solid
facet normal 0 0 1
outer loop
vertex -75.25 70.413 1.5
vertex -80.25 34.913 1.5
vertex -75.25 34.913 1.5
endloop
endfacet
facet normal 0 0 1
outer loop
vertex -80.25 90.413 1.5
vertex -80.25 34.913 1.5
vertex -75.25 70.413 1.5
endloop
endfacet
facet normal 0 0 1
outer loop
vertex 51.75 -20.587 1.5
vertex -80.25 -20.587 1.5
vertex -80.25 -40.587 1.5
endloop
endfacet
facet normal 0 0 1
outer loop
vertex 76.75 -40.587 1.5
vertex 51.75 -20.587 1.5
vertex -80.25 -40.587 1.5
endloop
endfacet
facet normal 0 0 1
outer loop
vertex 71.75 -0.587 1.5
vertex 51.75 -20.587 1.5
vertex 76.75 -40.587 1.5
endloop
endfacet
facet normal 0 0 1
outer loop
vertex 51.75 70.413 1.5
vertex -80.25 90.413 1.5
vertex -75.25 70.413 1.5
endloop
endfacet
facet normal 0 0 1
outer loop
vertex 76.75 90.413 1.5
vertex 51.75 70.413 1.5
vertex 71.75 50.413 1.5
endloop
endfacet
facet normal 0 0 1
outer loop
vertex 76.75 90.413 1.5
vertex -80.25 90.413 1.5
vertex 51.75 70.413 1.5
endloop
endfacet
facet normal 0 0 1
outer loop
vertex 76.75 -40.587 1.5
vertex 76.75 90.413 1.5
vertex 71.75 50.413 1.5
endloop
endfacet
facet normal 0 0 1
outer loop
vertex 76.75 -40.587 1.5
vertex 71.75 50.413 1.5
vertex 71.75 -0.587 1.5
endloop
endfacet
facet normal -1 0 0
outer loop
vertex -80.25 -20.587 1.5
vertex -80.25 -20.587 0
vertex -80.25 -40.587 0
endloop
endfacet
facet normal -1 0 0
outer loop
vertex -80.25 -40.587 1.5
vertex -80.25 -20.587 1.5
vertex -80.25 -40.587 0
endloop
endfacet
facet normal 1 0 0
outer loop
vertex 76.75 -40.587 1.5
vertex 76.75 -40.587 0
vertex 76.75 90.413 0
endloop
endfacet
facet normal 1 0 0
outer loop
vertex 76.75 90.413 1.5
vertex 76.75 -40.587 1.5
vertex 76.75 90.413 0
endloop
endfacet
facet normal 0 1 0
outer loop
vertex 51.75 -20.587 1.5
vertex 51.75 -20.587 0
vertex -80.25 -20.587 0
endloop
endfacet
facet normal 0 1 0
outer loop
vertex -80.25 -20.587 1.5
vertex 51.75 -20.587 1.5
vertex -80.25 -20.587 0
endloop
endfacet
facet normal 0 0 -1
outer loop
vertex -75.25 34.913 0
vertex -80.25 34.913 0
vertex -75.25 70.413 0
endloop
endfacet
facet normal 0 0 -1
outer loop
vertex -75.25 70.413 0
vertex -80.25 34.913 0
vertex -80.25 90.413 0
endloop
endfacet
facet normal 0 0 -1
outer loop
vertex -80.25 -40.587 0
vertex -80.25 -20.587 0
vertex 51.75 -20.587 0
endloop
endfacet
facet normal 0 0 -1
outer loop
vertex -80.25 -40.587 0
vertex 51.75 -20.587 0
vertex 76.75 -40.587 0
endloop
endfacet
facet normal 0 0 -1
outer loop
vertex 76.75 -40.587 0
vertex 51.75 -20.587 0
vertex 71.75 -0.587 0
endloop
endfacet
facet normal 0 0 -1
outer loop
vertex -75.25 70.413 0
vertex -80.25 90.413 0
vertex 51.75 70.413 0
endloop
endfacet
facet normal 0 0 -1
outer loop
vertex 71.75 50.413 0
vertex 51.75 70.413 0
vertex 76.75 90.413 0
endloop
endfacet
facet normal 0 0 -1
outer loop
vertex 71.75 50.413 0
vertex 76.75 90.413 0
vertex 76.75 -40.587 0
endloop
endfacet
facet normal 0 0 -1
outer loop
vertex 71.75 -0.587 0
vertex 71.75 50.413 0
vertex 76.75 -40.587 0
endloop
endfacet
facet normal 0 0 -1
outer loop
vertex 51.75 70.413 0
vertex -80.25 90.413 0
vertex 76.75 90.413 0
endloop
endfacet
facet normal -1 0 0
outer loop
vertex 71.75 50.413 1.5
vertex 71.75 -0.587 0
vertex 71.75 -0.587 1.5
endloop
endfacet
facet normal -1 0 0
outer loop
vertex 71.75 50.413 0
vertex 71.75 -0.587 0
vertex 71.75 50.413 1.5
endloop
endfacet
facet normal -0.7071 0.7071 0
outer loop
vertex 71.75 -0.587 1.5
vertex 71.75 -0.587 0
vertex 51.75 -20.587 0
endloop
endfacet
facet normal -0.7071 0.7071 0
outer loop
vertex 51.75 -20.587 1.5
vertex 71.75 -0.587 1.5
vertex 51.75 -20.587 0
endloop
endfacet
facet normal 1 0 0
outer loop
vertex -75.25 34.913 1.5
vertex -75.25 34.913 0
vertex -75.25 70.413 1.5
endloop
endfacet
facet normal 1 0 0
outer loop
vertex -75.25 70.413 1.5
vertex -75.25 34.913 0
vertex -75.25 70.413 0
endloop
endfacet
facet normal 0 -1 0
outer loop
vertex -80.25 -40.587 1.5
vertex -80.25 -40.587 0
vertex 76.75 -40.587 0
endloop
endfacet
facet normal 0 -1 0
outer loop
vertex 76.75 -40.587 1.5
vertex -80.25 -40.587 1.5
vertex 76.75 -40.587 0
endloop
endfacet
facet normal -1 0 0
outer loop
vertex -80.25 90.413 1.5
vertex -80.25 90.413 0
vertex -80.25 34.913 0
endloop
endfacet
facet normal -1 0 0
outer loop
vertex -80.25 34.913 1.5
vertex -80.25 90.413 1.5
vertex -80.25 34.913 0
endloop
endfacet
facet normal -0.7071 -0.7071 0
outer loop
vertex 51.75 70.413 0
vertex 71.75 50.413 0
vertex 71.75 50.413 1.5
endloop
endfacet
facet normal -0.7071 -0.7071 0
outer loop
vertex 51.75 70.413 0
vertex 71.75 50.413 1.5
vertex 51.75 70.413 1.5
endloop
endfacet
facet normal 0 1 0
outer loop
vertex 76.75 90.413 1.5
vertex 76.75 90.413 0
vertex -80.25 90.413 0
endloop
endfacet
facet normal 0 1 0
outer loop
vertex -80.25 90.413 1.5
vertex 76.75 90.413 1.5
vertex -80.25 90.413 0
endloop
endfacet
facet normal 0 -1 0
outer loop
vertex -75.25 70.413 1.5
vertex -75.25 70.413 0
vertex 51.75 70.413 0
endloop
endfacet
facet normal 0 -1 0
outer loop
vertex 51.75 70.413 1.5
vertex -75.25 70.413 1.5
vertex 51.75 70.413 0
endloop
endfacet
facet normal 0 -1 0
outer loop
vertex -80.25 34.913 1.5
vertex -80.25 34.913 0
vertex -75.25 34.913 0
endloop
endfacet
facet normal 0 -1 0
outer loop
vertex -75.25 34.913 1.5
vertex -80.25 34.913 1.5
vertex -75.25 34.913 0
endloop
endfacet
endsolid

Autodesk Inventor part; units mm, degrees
ref_plane "YZ Plane" through (0, 0, 0) normal (1, 0, 0) x (0, 1, 0)
ref_plane "XZ Plane" through (0, 0, 0) normal (0, 1, 0) x (-1, 0, 0)
ref_plane "XY Plane" through (0, 0, 0) normal (0, 0, 1) x (1, 0, 0)
sketch "Эскиз1" plane through (0, 0, 0) normal (0, 0, 1) x (1, 0, 0)
  line L0 (0, 0) -> (-80.25, 0) construction
  line L1 (-80.25, 0) -> (-80.25, -18.086) construction
  line L2 (-80.25, -18.086) -> (0, -18.086) construction
  line L3 (0, -18.086) -> (0, 0) construction
  line L4 (-80.25, -18.086) -> (-80.25, -40.587) construction
  line L5 (-80.25, -18.086) -> (-57.749, -18.086) construction
  line L6 (-80.25, -40.587) -> (76.75, -40.587)
  line L7 (76.75, -40.587) -> (76.75, 90.413)
  line L8 (76.75, 90.413) -> (-80.25, 90.413)
  line L9 (-80.25, 90.413) -> (-80.25, -40.587)
  line L10 (-80.25, -40.587) -> (76.75, -40.587)
  line L11 (76.75, -40.587) -> (76.75, -20.587)
  line L12 (76.75, -20.587) -> (-80.25, -20.587)
  line L13 (-80.25, -20.587) -> (-80.25, -40.587)
  line L14 (76.75, 90.413) -> (-80.25, 90.413)
  line L15 (-80.25, 90.413) -> (-80.25, 70.413)
  line L16 (-80.25, 70.413) -> (76.75, 70.413)
  line L17 (76.75, 70.413) -> (76.75, 90.413)
  line L18 (-80.25, -40.587) -> (-75.25, -40.587)
  line L19 (-75.25, -40.587) -> (-75.25, 90.413)
  line L20 (-75.25, 90.413) -> (-80.25, 90.413)
  line L21 (-80.25, 90.413) -> (-80.25, -40.587)
  line L22 (76.75, -40.587) -> (71.75, -40.587)
  line L23 (71.75, -40.587) -> (71.75, 90.413)
  line L24 (71.75, 90.413) -> (76.75, 90.413)
  line L25 (76.75, 90.413) -> (76.75, -40.587)
  line L26 (76.75, -40.587) -> (41.75, -40.587)
  line L27 (41.75, -40.587) -> (41.75, -20.587)
  line L28 (41.75, -40.587) -> (61.75, -40.587) construction
  line L29 (76.75, 24.913) -> (-80.25, 24.913)
  line L30 (41.75, 90.413) -> (41.75, 70.413)
  line L31 (71.75, 70.413) -> (71.75, 50.413)
  line L32 (71.75, 50.413) -> (51.75, 70.413)
  line L33 (71.75, 50.413) -> (100.0343, 50.413) construction
  line L34 (71.75, -0.587) -> (51.75, -20.587)
  line L35 (-75.25, 24.913) -> (-80.25, 24.913)
  line L36 (-80.25, 24.913) -> (-80.25, 34.913)
  line L37 (-80.25, 34.913) -> (-75.25, 34.913)
  line L38 (-75.25, 34.913) -> (-75.25, 24.913)
  point P0 (-75.25, -20.587)
  point P1 (-75.25, 70.413)
  point P2 (71.75, -20.587)
  dimension "d0" = 80.25
  dimension "d1" = 18.086
  dimension "d2" = 22.501
  dimension "d3" = 90
  dimension "d4" = 157
  dimension "d5" = 131
  dimension "d6" = 157
  dimension "d7" = 20
  dimension "d8" = 157
  dimension "d9" = 20
  dimension "d10" = 5
  dimension "d11" = 131
  dimension "d12" = 5
  dimension "d13" = 131
  dimension "d16" = 35
  dimension "d17" = 20
  dimension "d18" = 90
  dimension "d19" = 20
  dimension "d20" = 135
  dimension "d21" = 10
extrude "Выдавливание1" add sketch "Эскиз1" along normal blind 1.5 contours L9 L12 L19 L6 | L19 L12 L27 L6 | L27 L12 L23 L6 | L23 L12 L7 L6 | L9 L16 L19 L37 | L23 L29 L7 L12 | L12 L34 L23 | L23 L16 L7 L29 | L9 L8 L19 L16 | L19 L8 L30 L16 | L32 L16 L23 | L30 L8 L23 L16 | L23 L8 L7 L16
sketch "Эскиз2" plane through (-80.25, -40.587, 0) normal (0, -1, 0) x (1, 0, 0)
  line L0 (132, 0) -> (0, 0) projected
  line L1 (157, 0) -> (0, 0) projected
  line L2 (0, 0) -> (157, 0)
  line L3 (157, 0) -> (78.5, 0)
  line L4 (78.5, 0) -> (78.5, -20)
  line L5 (78.5, -20) -> (73.5, -20)
  line L6 (73.5, -20) -> (49.6649, 0)
  line L7 (78.5, -20) -> (83.5, -20)
  line L8 (83.5, -20) -> (107.3351, 0)
  point P0 (80.25, 0)
  dimension "d22" = 20
  dimension "d24" = 5
  dimension "d25" = 140
properties part number "sensor board"
